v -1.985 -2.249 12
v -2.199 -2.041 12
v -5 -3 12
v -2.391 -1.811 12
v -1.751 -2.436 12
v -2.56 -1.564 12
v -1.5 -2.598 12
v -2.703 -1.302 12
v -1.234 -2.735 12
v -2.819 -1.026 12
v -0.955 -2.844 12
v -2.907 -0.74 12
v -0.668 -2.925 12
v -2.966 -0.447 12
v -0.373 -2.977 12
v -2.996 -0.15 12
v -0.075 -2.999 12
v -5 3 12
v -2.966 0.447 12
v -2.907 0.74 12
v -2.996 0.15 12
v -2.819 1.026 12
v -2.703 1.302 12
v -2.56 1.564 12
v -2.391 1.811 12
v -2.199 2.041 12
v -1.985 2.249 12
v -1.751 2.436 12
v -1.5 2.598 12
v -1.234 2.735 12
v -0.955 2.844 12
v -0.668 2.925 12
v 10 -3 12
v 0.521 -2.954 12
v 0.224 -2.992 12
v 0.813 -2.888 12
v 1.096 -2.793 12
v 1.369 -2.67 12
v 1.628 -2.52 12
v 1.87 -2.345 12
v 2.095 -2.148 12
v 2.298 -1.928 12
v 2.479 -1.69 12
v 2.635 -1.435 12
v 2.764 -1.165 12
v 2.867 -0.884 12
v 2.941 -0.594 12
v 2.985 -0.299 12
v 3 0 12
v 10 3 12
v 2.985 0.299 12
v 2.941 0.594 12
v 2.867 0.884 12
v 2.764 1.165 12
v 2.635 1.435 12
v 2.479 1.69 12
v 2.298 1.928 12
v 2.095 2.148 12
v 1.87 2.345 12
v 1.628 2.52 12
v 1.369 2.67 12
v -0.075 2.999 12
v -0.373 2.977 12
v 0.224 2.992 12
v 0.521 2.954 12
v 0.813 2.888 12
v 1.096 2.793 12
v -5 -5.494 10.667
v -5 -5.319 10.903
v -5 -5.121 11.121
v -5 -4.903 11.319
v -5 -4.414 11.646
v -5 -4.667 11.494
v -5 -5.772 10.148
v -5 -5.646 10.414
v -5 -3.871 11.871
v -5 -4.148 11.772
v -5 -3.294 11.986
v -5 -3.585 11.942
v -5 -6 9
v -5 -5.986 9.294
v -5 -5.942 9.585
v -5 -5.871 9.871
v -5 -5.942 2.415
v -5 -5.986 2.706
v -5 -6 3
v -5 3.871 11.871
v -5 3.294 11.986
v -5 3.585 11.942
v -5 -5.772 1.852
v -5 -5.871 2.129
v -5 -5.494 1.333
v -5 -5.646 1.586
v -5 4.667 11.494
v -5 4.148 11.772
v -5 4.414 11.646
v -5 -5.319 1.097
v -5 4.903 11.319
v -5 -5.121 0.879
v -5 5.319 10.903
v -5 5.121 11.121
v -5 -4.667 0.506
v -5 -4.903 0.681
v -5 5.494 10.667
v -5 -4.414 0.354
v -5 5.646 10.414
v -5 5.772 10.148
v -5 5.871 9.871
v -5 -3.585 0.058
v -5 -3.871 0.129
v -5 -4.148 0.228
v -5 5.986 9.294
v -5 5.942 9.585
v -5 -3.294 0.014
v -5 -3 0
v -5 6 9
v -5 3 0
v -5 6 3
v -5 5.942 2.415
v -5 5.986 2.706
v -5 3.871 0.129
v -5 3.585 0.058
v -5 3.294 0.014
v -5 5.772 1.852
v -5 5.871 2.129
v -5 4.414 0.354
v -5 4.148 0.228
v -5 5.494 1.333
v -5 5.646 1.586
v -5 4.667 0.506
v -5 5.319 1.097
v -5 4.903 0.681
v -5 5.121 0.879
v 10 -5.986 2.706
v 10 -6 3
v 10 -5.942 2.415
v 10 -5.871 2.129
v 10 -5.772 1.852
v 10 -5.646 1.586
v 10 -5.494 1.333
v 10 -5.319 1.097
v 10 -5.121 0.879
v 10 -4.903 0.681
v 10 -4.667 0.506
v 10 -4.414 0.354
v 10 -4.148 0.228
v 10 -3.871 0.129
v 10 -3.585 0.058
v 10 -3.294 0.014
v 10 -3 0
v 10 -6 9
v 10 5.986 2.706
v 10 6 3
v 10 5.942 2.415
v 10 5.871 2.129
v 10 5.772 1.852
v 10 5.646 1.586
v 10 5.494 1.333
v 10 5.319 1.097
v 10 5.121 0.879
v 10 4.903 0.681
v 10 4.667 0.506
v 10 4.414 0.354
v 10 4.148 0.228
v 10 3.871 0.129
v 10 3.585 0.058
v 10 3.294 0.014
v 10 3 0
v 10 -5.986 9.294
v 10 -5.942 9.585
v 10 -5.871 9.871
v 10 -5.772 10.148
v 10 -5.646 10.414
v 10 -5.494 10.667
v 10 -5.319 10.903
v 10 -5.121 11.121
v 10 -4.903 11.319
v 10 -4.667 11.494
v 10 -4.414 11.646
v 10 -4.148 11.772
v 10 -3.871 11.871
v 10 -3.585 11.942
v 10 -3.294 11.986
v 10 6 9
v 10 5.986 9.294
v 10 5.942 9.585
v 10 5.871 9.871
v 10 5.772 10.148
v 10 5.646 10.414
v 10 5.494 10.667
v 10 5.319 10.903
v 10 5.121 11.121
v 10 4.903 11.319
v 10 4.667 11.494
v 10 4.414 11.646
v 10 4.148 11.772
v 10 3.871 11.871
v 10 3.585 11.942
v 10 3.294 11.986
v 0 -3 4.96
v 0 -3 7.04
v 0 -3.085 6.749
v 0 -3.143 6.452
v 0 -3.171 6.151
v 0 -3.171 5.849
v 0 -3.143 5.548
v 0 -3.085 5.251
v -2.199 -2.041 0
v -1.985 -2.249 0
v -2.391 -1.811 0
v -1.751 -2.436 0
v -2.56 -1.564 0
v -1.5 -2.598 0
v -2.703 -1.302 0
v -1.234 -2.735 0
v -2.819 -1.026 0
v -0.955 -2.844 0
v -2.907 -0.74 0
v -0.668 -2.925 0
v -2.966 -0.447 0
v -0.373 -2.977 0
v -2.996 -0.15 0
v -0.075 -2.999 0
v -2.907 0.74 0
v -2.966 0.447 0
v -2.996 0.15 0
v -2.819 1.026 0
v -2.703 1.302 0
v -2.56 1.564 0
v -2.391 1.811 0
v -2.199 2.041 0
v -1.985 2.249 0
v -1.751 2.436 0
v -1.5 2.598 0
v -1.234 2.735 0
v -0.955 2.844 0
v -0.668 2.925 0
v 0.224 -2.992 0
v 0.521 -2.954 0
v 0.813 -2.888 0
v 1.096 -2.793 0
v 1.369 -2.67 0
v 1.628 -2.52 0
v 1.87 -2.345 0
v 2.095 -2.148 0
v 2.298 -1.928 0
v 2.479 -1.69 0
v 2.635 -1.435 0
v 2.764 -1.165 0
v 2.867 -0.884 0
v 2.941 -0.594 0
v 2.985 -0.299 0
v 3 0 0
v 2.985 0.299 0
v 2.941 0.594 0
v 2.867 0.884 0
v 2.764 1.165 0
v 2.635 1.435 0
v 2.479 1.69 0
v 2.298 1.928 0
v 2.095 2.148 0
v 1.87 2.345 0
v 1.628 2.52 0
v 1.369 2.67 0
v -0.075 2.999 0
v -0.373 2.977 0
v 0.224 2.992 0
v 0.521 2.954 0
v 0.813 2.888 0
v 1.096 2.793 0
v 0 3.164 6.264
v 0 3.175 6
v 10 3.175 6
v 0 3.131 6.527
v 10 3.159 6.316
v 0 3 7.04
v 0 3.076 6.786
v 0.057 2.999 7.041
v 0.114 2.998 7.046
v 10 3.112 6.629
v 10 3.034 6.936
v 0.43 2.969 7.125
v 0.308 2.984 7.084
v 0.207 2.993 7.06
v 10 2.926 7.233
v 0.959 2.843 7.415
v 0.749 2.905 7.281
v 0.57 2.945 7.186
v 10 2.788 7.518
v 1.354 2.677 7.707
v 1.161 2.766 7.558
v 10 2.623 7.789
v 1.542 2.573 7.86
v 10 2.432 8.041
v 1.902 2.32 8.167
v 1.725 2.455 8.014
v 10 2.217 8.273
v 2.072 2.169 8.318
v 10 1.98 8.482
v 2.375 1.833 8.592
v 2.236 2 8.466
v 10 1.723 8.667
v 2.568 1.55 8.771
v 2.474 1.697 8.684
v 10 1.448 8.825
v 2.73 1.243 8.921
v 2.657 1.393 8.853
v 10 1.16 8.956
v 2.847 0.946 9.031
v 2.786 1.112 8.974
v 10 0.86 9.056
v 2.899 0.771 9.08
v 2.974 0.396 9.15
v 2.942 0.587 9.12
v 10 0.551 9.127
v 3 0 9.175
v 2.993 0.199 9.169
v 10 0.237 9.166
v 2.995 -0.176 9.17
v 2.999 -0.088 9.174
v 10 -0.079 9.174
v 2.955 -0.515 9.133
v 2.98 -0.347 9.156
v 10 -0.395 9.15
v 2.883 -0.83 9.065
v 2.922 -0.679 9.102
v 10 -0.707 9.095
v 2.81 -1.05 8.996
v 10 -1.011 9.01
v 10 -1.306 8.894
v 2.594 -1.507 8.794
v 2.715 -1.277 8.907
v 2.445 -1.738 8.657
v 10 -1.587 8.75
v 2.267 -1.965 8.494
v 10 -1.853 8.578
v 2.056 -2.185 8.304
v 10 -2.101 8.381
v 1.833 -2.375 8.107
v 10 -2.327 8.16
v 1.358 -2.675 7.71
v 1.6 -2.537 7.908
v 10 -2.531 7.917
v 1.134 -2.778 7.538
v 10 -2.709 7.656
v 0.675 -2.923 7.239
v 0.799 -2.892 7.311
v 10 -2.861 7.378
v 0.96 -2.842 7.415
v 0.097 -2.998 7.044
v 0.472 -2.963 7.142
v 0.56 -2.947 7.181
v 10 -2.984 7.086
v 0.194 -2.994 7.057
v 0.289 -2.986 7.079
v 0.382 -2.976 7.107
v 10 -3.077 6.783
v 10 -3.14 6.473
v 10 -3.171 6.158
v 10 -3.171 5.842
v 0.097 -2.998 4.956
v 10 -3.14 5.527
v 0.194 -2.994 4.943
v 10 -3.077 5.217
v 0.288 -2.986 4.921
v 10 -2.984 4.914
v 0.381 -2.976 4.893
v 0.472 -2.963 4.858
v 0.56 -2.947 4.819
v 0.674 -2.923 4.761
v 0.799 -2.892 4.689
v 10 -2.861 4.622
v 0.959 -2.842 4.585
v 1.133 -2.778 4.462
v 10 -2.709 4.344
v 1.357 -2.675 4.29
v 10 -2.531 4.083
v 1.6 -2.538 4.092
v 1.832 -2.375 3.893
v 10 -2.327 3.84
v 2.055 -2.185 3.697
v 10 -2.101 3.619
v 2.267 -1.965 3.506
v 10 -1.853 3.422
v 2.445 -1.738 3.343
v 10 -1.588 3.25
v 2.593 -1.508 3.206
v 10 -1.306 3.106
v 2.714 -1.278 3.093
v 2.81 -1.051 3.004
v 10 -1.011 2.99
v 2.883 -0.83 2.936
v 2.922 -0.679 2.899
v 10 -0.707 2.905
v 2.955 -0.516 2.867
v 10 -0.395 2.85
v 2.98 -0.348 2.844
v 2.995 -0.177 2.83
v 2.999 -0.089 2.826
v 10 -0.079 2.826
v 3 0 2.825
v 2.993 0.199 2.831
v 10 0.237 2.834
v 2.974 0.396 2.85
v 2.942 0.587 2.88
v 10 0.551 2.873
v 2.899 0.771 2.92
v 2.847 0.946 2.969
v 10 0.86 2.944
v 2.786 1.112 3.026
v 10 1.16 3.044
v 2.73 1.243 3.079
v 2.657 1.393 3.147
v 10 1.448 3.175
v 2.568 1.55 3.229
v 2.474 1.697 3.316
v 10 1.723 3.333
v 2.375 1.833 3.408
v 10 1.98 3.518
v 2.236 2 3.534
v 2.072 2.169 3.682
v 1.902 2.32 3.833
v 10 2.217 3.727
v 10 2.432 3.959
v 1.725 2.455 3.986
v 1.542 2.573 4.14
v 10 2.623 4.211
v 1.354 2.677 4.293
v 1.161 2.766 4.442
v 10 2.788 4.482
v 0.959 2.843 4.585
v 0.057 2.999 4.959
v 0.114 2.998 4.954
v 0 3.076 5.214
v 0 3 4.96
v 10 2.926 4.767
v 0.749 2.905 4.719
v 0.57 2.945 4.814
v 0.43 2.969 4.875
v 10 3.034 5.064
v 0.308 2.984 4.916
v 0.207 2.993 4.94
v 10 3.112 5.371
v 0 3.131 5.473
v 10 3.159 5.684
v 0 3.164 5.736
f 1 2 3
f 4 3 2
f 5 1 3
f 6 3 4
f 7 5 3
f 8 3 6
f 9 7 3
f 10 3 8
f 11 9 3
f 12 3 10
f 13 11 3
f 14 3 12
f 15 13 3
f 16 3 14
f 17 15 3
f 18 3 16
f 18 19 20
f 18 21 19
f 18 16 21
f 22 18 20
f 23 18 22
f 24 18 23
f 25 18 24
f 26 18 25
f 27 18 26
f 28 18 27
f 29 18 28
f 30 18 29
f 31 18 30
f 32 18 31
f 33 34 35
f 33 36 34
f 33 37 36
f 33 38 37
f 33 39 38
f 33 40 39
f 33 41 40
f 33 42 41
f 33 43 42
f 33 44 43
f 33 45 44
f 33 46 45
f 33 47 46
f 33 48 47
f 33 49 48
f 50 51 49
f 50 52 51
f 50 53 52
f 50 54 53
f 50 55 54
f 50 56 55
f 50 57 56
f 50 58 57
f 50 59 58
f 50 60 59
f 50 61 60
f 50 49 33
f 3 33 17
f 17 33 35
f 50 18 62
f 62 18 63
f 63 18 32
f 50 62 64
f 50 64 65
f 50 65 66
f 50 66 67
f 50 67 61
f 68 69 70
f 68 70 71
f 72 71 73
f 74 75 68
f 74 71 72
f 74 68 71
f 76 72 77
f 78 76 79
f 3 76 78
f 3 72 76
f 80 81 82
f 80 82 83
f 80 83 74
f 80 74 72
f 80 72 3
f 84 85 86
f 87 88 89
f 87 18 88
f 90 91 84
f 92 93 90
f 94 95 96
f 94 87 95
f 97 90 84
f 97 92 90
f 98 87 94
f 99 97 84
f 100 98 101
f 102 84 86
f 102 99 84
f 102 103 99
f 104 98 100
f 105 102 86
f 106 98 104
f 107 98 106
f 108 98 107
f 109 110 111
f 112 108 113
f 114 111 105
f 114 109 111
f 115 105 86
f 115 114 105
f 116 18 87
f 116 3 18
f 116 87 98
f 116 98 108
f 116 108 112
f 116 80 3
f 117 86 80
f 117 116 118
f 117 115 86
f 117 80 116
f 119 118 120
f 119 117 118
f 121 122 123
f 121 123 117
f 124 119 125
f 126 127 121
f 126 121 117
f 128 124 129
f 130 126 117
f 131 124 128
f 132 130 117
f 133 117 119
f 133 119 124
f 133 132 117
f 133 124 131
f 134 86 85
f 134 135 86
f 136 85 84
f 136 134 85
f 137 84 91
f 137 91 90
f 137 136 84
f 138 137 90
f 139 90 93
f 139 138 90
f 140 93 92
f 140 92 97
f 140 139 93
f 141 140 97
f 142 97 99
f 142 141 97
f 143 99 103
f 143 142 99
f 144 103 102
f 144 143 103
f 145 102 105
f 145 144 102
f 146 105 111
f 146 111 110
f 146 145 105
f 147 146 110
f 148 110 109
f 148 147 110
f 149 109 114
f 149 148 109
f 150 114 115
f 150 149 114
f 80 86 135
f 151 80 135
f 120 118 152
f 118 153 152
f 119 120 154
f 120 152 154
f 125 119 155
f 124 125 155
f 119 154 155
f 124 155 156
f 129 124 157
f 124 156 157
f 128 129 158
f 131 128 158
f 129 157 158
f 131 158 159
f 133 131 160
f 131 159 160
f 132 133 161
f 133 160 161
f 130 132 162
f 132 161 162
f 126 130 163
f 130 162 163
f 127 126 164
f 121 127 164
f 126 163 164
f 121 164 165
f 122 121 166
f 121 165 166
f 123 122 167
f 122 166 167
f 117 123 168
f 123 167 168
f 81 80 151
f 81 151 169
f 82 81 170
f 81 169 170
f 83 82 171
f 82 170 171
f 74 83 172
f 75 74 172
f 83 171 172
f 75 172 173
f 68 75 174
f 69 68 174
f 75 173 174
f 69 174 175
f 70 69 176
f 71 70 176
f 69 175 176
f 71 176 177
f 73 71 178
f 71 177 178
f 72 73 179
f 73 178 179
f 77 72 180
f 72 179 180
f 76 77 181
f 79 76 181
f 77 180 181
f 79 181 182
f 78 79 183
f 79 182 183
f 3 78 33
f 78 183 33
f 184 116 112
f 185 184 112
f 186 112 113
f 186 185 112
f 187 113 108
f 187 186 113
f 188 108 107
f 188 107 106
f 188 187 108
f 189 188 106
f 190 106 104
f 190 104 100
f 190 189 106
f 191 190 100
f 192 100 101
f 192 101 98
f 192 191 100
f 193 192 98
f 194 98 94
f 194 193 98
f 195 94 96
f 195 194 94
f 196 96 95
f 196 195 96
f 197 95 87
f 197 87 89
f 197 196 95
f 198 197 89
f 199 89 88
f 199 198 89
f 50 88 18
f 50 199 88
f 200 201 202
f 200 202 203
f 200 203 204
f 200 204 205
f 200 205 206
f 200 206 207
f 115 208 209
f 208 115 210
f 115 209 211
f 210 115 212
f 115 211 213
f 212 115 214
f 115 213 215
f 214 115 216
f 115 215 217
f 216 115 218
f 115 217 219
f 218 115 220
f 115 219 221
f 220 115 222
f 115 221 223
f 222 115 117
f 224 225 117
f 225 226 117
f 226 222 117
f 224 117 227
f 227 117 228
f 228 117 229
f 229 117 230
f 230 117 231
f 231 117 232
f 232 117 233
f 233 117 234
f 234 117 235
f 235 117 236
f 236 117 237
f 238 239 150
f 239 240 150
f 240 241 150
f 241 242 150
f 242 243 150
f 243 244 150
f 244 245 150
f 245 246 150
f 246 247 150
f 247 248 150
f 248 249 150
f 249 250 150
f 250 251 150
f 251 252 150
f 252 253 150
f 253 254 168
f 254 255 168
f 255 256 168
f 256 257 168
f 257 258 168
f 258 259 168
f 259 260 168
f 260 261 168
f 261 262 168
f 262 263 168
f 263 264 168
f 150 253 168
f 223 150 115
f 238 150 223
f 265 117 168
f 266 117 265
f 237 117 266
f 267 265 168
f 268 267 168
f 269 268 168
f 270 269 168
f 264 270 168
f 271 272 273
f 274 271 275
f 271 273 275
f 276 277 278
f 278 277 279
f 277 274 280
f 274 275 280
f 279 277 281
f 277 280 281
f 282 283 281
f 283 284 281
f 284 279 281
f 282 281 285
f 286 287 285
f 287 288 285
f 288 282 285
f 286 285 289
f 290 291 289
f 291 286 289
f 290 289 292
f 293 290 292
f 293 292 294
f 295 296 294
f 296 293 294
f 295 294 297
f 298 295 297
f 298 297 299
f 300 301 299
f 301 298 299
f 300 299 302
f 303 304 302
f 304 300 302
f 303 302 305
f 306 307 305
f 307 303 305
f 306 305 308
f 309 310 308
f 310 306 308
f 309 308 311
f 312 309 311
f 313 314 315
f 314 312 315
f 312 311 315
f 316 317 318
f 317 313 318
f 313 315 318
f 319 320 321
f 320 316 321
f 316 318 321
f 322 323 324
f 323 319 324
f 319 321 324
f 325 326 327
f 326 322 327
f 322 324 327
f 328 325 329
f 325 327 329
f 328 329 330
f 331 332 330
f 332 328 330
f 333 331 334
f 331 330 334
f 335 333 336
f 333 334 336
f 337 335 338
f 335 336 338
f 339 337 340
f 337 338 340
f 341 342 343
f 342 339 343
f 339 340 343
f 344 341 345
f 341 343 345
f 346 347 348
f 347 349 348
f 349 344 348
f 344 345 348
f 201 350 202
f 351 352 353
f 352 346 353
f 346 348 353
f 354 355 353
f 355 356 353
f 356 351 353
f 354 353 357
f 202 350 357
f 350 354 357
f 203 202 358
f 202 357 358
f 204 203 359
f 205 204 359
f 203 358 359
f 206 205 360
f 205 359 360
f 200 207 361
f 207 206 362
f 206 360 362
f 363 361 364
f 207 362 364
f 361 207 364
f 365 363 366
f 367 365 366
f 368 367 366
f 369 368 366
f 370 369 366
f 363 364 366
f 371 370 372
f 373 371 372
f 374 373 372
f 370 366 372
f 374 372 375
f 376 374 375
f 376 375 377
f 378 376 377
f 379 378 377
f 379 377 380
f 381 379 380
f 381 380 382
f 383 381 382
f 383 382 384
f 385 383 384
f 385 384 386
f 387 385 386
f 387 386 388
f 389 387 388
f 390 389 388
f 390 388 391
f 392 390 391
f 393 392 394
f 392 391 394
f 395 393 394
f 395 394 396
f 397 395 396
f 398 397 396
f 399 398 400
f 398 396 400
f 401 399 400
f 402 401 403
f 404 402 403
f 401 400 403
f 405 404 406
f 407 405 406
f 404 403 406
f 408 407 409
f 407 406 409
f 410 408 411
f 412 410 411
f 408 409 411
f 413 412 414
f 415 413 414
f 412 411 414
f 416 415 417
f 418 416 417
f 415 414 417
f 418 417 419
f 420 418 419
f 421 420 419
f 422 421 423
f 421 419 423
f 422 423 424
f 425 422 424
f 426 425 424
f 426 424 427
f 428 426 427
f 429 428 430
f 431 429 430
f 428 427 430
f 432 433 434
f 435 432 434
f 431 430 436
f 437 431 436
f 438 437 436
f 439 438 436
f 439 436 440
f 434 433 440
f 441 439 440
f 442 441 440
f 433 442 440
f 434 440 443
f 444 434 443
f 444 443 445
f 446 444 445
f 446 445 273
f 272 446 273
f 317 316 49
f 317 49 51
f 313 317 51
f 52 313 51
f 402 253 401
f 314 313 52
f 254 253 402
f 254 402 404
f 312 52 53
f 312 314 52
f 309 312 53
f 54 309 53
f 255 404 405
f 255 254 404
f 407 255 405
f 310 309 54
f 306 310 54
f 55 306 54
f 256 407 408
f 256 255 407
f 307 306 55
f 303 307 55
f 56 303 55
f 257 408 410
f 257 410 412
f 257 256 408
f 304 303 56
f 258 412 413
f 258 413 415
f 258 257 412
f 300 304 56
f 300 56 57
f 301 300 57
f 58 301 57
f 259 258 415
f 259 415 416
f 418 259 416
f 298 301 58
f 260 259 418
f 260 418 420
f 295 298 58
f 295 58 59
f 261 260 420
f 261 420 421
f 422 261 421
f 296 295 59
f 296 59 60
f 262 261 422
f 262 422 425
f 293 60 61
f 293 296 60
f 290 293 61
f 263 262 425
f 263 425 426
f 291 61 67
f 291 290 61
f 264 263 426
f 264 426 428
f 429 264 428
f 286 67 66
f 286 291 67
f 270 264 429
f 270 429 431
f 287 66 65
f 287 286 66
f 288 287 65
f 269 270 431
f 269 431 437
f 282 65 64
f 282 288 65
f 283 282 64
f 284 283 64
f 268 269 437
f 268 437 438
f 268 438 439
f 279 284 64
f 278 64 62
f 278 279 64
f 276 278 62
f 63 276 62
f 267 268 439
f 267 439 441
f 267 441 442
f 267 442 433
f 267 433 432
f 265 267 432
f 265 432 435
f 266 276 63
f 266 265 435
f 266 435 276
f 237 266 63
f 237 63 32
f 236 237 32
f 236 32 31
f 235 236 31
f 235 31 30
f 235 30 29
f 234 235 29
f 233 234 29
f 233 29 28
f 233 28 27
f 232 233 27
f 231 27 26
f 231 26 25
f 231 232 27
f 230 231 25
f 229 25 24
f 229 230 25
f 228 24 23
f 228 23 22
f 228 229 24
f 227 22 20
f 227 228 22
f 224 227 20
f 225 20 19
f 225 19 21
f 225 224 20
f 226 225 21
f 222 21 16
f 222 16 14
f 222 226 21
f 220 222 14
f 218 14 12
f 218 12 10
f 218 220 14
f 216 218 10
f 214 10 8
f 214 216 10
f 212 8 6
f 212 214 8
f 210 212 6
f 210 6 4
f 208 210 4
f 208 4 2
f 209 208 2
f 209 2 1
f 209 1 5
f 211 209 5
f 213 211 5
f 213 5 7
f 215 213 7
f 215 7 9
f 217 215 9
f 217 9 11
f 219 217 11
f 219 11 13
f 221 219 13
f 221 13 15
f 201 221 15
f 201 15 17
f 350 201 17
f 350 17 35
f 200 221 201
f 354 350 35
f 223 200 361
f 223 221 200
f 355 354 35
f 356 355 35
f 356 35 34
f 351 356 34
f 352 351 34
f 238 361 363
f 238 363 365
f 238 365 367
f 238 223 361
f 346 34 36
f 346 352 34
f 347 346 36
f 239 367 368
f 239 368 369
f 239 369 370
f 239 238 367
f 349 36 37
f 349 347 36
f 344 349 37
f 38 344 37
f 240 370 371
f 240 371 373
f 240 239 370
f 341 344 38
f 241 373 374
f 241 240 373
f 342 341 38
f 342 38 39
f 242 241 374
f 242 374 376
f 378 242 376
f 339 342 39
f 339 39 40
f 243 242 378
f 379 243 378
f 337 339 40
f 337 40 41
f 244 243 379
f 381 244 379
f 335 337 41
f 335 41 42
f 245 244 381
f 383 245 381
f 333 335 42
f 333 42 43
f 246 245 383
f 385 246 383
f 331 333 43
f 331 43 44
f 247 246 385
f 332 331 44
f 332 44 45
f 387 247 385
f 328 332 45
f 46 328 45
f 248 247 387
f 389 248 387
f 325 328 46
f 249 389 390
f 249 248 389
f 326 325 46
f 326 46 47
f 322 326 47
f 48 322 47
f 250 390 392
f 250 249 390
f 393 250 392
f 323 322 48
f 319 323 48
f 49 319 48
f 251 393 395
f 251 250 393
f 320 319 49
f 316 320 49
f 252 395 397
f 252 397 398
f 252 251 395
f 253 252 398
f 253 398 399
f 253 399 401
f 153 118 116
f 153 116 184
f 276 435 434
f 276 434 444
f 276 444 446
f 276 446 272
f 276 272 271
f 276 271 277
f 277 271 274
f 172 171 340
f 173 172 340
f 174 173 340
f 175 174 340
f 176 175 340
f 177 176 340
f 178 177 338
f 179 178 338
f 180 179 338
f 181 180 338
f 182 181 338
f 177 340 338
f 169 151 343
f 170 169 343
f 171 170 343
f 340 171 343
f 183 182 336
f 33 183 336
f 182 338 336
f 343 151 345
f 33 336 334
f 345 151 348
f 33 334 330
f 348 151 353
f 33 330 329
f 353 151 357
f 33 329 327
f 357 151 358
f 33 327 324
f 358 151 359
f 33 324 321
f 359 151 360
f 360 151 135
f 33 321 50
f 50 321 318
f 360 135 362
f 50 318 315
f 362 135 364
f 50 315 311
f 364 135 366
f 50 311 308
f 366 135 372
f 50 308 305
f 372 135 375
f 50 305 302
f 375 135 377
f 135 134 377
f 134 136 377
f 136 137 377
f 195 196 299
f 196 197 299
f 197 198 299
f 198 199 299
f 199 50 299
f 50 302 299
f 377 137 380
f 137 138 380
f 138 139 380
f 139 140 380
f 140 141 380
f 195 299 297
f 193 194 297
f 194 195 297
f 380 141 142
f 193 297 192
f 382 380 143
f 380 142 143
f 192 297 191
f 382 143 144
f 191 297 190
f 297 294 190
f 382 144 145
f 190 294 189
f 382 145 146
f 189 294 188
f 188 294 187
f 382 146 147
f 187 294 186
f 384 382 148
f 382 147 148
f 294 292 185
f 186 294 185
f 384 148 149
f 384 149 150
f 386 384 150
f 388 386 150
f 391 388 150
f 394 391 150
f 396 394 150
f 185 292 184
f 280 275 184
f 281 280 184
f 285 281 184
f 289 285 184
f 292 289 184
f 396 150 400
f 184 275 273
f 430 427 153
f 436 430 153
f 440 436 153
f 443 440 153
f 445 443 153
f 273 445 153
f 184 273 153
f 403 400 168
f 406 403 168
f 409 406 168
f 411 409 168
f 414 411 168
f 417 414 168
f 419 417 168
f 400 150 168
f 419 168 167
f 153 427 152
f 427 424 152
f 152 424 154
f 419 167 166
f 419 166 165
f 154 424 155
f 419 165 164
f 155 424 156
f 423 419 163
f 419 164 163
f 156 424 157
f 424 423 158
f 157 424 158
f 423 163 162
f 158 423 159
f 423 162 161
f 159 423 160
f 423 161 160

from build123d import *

# Parameters (mm, degrees)
SKETCH1_W           = 15
SKETCH1_H           = 12
SKETCH1_R           = 3
BOSS_EXTRUDE1_DEPTH = 12
SKETCH2_R           = 3.175
CUT_EXTRUDE1_DEPTH  = 10
FILLET1_R           = 3


with BuildPart() as part:
    # Sketch1 → Boss-Extrude1 (new body)
    with BuildSketch(Plane.XY):
        with Locations((2.5, 0)):
            Rectangle(SKETCH1_W, SKETCH1_H)
        Circle(SKETCH1_R, mode=Mode.SUBTRACT)
    extrude(amount=BOSS_EXTRUDE1_DEPTH)

    # Sketch2 → Cut-Extrude1 (cut)
    with BuildSketch(Plane(origin=(10, 0, 0), x_dir=(0, 0, -1), z_dir=(1, 0, 0))):
        with Locations(Location((-6, 0, 0), (0, 0, 90))):
            Circle(SKETCH2_R)
    extrude(amount=-CUT_EXTRUDE1_DEPTH, mode=Mode.SUBTRACT)

    # Fillet1
    fillet1_edges = [part.edges().sort_by_distance(p)[0] for p in [
        (2.5, 6, 12),
        (2.5, 6, 0),
        (2.5, -6, 0),
        (2.5, -6, 12),
    ]]
    fillet(fillet1_edges, radius=FILLET1_R - 0.0001)  # a hair under: the kernel refuses the full size


solid = part.part
